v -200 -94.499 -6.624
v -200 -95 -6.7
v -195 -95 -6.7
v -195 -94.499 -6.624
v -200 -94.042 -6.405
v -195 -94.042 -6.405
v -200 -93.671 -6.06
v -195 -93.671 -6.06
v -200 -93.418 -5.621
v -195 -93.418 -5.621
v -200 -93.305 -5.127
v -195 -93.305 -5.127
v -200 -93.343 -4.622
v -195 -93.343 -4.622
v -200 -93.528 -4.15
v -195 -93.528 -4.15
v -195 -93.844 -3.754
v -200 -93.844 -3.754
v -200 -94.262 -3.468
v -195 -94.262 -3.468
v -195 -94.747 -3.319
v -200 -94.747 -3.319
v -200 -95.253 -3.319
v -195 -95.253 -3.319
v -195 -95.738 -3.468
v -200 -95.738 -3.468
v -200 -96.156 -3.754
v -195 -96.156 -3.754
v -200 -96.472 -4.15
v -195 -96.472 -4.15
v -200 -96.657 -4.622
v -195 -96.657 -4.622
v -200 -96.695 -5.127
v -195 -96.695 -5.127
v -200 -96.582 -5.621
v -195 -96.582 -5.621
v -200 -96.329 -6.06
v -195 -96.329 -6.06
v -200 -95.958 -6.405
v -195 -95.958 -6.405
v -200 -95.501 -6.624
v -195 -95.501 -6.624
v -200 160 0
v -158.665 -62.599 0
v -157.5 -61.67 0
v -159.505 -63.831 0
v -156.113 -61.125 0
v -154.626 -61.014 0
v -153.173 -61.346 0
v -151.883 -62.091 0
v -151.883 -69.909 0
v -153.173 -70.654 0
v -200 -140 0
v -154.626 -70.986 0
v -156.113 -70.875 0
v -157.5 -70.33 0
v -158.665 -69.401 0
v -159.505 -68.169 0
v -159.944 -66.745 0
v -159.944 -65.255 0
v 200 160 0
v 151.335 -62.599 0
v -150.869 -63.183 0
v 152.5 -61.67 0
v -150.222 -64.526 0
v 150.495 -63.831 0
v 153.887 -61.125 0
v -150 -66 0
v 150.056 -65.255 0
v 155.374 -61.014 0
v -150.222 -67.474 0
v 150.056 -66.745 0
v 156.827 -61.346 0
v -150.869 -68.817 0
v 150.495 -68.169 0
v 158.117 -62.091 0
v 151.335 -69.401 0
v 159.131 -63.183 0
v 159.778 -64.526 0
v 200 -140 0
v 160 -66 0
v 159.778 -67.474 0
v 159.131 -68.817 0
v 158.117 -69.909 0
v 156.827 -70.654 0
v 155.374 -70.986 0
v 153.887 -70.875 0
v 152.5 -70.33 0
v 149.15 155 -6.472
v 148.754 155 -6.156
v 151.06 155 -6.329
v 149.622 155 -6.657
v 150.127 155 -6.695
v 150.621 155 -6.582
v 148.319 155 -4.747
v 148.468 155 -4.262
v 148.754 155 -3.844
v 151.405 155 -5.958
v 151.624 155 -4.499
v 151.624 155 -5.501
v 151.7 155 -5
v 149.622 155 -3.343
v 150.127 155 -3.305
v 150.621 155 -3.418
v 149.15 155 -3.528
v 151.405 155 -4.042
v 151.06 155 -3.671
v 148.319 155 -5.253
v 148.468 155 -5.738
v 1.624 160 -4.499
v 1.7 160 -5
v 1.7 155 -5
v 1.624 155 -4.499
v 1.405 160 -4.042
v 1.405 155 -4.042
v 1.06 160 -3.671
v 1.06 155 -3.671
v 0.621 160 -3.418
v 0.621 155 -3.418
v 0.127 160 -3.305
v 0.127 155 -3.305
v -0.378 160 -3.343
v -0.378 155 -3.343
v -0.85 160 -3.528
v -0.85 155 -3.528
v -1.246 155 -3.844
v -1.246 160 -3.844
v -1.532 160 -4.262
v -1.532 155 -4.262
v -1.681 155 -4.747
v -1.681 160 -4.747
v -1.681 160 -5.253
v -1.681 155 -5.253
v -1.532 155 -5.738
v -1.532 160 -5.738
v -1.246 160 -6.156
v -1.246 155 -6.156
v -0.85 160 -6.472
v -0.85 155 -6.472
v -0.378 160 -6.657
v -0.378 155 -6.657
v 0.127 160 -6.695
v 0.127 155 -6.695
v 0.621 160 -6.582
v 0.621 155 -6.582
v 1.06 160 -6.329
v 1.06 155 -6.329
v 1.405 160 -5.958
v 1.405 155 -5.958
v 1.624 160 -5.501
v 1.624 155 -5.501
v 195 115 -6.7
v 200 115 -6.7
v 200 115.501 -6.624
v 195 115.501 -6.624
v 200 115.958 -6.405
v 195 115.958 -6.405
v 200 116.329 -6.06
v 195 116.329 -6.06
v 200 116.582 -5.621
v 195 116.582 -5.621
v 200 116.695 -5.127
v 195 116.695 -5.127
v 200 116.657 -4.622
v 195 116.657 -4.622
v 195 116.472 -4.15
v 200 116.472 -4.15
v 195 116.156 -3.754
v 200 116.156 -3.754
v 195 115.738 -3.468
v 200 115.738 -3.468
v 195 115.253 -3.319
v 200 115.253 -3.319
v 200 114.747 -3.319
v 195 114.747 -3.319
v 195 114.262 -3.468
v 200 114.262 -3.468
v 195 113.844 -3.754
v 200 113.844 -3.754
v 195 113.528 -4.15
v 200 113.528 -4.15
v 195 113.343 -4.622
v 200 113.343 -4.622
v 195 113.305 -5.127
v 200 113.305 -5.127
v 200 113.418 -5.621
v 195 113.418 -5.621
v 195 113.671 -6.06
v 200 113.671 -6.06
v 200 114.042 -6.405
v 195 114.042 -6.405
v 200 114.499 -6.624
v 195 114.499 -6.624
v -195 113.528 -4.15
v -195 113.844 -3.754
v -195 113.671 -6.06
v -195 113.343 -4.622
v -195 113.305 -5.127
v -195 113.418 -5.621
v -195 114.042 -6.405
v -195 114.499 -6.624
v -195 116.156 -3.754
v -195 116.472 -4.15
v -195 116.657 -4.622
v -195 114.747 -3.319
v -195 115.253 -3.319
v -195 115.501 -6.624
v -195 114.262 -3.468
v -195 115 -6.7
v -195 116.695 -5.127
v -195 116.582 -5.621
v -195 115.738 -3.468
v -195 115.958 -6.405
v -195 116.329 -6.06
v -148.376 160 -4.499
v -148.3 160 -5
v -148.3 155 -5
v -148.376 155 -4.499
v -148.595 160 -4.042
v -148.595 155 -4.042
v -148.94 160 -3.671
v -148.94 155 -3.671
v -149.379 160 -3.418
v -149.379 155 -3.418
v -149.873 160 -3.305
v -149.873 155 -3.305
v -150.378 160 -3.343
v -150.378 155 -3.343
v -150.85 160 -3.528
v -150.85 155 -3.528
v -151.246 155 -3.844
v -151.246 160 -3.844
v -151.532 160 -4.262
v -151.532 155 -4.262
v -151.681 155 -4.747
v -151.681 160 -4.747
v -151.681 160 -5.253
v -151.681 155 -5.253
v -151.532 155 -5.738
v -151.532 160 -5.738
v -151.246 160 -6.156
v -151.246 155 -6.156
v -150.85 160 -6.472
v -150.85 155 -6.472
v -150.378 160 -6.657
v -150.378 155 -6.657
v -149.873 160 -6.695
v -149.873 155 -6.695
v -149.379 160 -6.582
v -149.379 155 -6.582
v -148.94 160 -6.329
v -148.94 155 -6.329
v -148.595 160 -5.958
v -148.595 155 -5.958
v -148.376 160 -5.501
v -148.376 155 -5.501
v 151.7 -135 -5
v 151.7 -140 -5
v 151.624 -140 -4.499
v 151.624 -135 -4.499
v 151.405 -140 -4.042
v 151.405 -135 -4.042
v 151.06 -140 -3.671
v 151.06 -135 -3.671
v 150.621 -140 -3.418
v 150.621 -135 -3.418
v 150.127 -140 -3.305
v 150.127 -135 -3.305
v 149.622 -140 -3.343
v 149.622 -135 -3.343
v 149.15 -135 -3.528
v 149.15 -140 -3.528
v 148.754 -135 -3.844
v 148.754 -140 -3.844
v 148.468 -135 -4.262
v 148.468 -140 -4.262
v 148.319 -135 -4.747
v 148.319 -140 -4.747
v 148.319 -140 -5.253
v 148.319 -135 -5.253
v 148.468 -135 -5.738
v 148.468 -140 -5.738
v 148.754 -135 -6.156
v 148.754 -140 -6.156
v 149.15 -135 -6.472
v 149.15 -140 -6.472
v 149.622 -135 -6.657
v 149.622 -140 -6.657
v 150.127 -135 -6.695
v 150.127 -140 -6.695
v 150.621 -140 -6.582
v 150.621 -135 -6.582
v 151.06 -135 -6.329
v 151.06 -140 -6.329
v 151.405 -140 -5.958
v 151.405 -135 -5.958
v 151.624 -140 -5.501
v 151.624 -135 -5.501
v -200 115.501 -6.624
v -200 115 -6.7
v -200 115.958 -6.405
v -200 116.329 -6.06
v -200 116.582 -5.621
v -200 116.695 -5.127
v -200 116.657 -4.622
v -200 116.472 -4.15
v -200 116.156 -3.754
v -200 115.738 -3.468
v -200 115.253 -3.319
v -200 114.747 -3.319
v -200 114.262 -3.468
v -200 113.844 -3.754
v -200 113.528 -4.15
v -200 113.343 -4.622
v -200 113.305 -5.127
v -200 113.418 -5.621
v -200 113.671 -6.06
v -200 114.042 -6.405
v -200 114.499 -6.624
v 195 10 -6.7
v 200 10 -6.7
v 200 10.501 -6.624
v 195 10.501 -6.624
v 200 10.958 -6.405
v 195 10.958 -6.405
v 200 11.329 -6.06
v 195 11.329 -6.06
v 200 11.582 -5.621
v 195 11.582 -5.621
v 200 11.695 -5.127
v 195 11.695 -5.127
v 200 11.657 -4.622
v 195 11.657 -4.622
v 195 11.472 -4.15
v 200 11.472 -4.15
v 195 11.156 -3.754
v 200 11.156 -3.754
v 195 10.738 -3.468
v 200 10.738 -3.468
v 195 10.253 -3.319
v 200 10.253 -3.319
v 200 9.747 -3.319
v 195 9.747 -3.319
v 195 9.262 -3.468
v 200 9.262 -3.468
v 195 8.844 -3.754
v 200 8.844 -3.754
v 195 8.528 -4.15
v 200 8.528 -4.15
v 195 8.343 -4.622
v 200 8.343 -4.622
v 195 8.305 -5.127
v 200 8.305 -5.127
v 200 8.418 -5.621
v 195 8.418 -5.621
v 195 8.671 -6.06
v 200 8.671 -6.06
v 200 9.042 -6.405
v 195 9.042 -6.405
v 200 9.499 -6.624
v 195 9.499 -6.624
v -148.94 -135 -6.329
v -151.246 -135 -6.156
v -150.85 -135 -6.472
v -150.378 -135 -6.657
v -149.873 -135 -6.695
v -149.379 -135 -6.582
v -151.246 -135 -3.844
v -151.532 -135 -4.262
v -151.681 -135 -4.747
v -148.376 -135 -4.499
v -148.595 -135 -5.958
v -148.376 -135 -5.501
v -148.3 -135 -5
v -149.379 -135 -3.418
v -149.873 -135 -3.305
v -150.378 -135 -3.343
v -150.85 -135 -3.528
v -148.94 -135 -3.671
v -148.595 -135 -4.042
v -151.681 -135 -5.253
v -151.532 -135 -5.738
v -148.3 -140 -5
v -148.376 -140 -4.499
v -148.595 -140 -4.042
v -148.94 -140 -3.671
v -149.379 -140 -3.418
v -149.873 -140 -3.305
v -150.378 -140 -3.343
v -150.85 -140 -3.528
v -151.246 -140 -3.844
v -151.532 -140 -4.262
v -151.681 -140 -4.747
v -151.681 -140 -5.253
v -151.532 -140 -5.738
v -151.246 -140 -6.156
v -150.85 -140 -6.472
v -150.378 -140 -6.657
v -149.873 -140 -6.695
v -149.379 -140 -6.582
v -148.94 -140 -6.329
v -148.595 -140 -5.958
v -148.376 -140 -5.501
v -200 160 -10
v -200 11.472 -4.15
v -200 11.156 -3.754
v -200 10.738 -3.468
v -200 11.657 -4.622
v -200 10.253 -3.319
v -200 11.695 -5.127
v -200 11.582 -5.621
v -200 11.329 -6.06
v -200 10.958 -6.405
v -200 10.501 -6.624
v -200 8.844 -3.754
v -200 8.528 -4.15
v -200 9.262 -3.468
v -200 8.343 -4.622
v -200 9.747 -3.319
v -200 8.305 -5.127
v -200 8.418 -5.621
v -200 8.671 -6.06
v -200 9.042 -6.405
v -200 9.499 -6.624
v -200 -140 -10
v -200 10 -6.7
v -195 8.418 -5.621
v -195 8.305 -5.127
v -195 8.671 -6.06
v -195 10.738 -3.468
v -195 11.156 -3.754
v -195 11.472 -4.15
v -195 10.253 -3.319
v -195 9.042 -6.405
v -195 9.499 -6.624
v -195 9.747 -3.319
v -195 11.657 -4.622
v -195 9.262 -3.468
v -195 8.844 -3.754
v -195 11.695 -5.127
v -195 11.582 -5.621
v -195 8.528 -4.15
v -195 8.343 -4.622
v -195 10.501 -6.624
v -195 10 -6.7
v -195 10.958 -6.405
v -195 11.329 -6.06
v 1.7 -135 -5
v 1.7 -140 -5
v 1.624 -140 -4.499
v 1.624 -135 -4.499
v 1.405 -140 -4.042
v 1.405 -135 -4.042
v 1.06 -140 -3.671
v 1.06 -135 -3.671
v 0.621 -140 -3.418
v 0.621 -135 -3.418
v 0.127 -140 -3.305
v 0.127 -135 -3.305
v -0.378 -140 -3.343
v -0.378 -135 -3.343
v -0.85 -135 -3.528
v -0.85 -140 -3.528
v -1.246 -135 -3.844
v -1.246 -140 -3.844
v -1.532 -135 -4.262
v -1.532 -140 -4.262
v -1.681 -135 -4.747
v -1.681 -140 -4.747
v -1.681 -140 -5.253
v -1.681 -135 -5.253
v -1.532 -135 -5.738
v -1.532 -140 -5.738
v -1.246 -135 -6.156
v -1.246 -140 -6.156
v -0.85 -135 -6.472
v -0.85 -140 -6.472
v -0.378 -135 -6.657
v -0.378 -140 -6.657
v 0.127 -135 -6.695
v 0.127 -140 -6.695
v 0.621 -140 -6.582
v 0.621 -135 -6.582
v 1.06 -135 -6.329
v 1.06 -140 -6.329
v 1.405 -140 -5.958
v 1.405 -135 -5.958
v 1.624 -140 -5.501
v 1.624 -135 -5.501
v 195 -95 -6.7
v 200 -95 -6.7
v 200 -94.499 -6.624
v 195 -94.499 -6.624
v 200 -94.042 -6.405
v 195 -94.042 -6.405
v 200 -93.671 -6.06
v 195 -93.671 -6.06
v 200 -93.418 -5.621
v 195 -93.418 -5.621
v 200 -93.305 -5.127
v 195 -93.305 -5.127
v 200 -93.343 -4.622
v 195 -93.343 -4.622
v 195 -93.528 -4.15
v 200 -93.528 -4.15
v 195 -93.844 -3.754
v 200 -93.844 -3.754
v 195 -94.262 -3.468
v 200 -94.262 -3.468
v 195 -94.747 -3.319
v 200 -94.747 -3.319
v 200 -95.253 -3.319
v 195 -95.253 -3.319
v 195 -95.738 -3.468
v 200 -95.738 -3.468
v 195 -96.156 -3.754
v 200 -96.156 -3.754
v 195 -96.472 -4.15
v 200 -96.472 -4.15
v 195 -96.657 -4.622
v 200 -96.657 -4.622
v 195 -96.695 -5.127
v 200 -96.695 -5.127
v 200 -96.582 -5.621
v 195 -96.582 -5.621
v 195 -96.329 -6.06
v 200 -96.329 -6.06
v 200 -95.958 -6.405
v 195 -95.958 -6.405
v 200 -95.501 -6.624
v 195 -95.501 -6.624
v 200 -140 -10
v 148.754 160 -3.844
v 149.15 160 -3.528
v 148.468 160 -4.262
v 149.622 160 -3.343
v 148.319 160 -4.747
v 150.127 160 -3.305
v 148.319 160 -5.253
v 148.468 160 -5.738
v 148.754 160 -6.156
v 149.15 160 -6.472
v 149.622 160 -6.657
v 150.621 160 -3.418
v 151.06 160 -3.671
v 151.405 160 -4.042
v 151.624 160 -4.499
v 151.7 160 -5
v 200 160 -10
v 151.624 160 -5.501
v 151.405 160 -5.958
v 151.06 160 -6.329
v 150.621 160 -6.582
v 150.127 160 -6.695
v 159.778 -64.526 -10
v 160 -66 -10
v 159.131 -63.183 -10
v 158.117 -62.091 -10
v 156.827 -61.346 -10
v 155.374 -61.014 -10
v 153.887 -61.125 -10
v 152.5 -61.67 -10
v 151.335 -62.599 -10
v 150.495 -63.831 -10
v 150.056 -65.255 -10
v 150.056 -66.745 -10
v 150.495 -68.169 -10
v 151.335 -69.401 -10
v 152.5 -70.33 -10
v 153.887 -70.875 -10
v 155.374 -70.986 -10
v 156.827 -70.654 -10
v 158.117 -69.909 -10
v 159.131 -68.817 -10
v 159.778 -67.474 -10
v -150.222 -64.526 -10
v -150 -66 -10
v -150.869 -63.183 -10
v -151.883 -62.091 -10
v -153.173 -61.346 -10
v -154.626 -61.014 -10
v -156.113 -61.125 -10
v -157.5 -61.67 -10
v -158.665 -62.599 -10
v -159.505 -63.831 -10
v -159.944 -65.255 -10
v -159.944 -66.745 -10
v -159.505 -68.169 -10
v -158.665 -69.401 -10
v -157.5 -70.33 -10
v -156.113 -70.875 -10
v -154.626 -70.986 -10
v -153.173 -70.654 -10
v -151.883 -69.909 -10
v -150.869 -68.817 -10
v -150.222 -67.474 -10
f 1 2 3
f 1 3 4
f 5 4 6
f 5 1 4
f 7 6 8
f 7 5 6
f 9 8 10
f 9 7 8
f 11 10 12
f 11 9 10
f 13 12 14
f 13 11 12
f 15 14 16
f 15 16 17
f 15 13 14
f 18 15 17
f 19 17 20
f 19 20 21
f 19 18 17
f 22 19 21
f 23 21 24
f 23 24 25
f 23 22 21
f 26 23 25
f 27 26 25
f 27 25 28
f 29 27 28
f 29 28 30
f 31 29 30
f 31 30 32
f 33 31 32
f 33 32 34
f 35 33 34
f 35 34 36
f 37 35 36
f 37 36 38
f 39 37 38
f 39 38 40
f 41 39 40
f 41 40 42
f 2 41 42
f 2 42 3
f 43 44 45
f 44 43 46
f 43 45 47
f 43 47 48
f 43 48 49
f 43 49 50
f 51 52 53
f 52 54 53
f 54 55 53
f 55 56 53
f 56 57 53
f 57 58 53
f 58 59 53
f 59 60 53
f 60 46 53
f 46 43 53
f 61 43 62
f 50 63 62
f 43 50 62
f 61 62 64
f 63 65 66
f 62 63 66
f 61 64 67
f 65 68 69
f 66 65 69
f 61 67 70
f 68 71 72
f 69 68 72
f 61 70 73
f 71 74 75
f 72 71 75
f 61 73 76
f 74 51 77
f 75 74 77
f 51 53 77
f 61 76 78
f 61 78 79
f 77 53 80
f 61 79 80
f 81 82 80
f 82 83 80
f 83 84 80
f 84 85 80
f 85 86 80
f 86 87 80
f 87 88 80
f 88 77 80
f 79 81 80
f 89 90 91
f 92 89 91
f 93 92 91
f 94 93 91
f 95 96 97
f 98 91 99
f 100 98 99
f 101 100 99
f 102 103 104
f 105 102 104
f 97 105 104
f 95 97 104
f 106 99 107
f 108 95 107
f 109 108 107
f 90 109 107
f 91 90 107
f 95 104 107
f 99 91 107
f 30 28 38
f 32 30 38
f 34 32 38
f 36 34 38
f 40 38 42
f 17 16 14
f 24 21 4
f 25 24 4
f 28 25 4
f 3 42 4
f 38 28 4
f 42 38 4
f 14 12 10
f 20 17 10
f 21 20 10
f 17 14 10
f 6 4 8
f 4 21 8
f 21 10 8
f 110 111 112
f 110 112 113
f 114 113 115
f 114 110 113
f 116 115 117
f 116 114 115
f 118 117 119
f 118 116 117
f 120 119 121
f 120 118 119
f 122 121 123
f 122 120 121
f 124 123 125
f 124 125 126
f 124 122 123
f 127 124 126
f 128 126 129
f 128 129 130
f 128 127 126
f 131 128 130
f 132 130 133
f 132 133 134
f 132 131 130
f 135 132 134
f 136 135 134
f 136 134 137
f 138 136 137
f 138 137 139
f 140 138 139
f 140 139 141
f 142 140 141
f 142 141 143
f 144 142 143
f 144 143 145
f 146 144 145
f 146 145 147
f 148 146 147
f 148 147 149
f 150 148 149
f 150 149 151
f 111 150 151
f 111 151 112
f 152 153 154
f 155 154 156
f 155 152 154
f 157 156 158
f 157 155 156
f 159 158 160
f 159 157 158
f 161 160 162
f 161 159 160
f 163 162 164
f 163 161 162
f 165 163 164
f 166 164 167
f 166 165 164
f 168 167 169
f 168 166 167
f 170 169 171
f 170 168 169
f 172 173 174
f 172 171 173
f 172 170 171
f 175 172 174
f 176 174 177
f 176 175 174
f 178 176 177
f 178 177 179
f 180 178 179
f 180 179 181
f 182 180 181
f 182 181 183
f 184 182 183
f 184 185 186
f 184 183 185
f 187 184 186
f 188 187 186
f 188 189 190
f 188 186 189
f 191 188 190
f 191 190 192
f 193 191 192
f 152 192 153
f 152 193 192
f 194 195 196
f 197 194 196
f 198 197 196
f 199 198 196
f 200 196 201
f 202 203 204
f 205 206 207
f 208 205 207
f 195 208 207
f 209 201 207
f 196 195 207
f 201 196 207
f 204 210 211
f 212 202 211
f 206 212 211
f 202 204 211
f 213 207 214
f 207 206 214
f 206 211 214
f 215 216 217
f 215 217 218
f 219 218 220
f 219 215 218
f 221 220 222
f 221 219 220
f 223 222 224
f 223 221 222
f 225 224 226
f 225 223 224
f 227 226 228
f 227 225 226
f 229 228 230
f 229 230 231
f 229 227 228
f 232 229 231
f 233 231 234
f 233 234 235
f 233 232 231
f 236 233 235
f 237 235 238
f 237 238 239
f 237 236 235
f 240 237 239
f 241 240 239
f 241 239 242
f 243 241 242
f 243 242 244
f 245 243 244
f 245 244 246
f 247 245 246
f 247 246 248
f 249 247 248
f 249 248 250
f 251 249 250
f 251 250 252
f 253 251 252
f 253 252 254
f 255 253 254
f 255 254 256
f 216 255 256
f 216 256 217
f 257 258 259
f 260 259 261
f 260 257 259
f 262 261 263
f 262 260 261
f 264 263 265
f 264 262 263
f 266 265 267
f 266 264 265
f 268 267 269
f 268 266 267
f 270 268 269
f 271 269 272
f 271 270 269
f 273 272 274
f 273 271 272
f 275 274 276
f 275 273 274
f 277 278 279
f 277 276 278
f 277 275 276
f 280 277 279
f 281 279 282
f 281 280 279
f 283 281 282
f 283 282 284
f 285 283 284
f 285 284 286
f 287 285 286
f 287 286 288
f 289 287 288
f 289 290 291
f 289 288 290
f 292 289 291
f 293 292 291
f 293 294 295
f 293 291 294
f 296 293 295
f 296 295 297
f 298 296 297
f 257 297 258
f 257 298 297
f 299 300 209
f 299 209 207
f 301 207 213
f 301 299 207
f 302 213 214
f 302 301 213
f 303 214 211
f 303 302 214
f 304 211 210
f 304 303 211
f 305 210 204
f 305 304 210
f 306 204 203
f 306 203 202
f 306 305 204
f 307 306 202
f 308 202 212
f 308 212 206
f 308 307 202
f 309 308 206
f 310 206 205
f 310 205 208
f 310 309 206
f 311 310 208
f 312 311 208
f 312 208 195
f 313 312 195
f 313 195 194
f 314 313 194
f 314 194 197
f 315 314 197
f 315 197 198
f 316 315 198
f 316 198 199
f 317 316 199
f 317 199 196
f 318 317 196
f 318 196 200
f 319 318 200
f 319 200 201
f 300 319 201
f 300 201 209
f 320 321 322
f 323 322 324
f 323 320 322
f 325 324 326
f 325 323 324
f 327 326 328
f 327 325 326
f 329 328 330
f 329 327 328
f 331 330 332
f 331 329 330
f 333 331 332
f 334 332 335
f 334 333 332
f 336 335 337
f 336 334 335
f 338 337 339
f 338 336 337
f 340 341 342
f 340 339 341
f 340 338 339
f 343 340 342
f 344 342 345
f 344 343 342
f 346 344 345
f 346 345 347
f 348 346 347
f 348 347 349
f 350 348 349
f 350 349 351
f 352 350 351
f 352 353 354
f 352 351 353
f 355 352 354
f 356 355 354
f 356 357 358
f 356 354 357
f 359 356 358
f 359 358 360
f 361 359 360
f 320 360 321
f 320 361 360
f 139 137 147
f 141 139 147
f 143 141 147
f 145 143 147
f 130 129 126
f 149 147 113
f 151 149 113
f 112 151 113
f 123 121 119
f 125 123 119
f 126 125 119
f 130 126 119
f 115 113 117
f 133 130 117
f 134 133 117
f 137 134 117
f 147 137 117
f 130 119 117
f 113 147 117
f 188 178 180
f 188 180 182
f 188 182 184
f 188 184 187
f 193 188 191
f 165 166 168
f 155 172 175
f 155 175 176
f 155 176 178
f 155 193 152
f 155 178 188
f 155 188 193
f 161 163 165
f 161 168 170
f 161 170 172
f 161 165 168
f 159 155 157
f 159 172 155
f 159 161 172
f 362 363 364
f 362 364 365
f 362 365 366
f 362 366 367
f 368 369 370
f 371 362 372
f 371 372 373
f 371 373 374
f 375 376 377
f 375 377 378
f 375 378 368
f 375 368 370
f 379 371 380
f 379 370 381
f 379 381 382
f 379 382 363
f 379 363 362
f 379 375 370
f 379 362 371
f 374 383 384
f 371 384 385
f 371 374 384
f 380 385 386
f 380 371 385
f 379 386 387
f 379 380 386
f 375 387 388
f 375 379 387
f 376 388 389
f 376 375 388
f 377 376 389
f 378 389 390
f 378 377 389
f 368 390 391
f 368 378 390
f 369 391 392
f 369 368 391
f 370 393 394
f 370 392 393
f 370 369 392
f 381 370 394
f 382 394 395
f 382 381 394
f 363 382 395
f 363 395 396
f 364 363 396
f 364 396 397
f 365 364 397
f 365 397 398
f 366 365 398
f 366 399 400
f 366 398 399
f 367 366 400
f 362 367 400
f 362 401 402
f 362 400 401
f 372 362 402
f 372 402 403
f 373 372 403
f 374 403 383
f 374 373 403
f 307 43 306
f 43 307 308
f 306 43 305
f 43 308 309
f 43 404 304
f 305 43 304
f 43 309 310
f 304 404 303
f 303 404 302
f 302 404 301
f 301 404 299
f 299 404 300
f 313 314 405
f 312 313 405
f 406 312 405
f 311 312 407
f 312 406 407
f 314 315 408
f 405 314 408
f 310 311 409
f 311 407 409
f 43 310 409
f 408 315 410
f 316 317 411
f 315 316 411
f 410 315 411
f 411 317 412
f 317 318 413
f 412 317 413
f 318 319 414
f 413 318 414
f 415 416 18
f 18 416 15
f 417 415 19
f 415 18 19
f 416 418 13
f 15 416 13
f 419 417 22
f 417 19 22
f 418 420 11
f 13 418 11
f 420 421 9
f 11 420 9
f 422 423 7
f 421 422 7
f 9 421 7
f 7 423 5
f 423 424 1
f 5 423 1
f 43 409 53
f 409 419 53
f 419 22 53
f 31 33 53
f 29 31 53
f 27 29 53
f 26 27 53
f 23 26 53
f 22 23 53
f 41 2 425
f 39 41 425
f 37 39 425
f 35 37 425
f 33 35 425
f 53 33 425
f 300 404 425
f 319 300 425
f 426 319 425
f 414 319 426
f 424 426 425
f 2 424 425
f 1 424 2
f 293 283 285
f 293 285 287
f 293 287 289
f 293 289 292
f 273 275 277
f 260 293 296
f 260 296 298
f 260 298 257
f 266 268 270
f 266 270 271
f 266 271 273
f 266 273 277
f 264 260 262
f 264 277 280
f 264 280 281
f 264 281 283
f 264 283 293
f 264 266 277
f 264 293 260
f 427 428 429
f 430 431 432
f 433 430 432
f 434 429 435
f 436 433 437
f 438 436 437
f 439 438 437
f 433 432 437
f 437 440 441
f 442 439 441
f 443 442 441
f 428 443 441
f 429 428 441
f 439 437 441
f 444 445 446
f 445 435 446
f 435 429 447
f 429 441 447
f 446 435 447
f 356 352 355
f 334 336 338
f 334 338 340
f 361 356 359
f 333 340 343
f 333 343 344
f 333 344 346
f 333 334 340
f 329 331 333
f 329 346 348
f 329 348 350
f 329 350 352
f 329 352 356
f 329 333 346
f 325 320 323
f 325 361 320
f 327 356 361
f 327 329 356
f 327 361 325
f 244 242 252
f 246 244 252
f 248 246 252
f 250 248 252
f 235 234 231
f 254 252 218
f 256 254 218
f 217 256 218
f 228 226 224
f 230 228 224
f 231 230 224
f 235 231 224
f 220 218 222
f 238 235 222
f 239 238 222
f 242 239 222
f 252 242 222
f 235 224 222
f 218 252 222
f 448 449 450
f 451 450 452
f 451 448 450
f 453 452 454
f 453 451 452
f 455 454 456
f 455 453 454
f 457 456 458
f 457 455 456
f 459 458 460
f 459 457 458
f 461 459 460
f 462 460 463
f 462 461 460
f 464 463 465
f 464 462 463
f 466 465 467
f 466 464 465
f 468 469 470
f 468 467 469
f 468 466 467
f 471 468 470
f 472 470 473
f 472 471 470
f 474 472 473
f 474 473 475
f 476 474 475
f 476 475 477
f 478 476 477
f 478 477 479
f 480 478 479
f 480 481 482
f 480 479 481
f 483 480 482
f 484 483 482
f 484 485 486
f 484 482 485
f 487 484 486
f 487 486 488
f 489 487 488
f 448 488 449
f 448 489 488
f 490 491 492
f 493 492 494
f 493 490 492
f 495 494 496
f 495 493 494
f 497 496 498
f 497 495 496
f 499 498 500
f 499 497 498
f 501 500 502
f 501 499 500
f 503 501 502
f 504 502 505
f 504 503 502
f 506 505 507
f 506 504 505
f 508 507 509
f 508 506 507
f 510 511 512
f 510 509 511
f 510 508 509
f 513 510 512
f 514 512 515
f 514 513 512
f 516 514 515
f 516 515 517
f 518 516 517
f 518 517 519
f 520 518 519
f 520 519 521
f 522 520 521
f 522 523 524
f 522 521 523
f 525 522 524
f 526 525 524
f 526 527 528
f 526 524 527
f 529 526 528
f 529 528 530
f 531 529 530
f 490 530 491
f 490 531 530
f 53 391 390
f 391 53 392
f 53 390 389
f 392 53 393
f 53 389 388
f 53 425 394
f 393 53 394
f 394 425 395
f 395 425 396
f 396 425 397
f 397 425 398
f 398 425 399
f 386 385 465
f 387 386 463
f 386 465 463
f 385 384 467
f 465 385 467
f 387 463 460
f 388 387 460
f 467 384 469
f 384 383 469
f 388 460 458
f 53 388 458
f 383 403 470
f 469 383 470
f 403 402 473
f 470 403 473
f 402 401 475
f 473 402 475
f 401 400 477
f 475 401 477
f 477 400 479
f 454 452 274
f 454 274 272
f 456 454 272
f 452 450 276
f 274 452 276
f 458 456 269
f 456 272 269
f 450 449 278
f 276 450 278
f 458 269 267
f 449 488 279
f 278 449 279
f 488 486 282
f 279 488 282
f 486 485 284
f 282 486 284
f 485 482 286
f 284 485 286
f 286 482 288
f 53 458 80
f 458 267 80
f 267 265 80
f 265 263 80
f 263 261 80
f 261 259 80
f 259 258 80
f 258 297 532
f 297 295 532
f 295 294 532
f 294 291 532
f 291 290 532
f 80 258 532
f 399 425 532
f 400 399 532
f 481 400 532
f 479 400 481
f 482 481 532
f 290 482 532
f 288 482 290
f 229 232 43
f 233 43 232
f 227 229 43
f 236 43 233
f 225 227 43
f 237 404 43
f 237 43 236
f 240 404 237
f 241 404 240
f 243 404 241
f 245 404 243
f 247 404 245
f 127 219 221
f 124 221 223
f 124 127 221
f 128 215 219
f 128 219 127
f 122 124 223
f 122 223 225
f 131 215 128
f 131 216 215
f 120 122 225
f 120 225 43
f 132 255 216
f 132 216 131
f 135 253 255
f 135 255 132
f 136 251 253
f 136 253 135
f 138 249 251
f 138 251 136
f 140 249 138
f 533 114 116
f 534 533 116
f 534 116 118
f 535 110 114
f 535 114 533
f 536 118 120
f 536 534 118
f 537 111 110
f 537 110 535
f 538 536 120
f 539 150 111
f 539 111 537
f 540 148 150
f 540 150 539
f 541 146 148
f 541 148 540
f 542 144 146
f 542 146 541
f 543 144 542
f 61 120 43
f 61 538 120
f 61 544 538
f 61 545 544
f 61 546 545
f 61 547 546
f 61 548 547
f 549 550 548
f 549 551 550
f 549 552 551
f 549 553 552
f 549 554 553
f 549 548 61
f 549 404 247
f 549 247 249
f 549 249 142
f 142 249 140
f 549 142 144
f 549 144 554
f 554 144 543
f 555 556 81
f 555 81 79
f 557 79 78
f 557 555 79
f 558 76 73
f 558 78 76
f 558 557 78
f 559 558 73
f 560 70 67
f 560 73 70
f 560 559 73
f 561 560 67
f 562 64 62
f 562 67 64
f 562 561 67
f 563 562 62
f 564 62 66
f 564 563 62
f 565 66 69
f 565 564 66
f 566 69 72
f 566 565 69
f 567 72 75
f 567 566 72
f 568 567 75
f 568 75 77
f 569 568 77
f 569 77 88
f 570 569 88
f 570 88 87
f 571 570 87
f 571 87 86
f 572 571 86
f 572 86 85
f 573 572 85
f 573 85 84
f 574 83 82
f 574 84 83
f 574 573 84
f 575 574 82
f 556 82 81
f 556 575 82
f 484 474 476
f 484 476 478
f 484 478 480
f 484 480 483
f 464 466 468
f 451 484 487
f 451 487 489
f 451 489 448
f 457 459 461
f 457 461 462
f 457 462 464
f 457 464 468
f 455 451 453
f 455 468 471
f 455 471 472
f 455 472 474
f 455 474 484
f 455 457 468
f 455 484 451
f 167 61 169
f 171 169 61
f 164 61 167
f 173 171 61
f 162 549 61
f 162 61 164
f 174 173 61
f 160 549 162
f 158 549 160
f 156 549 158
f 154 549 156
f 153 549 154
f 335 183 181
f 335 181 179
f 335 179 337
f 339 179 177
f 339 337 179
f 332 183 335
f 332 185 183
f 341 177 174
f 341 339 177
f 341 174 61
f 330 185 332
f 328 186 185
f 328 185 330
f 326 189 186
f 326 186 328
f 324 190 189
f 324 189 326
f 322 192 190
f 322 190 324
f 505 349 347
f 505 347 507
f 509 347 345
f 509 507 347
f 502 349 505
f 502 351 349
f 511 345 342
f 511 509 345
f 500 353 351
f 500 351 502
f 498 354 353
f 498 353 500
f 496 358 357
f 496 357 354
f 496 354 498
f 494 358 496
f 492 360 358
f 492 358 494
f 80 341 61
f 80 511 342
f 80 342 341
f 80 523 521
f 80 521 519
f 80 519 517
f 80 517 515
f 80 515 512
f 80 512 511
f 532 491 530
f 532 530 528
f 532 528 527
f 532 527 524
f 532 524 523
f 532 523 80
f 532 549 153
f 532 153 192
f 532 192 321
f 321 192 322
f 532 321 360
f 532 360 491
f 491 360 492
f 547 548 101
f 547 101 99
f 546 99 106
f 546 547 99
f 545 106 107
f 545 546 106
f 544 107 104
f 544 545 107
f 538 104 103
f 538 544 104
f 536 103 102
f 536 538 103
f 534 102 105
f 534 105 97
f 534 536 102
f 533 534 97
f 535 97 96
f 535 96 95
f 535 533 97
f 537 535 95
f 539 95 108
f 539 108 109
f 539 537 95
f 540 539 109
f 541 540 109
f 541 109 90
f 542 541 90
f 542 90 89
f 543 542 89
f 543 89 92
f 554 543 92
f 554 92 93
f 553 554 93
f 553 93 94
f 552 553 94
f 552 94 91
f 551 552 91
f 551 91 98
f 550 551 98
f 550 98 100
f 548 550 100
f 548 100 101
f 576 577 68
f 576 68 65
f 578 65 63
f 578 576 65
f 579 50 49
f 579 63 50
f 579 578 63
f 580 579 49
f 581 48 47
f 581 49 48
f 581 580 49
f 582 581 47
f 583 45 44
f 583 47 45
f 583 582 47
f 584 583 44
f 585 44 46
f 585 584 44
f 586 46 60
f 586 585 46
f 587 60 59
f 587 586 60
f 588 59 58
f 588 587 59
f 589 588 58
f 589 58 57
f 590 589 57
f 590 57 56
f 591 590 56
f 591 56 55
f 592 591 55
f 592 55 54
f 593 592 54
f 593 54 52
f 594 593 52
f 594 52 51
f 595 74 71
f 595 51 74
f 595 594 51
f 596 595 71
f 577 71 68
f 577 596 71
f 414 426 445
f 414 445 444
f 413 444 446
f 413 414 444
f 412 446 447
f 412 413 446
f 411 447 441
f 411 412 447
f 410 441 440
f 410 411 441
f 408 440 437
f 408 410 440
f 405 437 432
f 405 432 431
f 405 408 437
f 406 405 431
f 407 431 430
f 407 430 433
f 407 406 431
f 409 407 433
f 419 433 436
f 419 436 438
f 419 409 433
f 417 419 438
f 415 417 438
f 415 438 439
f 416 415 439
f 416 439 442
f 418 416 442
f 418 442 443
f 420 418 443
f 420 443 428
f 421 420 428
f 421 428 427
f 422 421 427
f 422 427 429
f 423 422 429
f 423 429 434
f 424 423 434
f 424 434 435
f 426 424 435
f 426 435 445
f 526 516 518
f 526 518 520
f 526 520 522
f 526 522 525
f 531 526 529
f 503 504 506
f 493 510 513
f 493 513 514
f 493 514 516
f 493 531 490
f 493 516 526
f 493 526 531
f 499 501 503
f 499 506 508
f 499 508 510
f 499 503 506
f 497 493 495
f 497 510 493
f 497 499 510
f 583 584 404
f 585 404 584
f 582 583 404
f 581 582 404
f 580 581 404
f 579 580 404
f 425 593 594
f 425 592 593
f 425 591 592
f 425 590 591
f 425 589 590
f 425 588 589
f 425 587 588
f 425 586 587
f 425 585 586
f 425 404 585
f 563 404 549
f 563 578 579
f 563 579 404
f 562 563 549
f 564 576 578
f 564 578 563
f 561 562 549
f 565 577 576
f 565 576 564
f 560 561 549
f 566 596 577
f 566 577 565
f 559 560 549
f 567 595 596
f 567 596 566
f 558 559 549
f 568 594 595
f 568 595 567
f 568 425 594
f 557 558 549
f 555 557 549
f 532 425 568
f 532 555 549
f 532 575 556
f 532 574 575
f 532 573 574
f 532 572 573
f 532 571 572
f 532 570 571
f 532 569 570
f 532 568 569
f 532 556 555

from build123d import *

# Parameters (mm, degrees)
CYLINDER050_R           = 1.7
CYLINDER050_DEPTH       = 20
CYLINDER050_PITCH_ANGLE = 90
CYLINDER049_R           = 1.7
CYLINDER049_DEPTH       = 20
CYLINDER049_PITCH_ANGLE = 90
CYLINDER051_R           = 1.7
CYLINDER051_DEPTH       = 20
CYLINDER051_PITCH_ANGLE = 90
CYLINDER047_R           = 1.7
CYLINDER047_DEPTH       = 20
CYLINDER047_PITCH_ANGLE = 90
CYLINDER046_R           = 1.7
CYLINDER046_DEPTH       = 20
CYLINDER046_PITCH_ANGLE = 90
CYLINDER048_R           = 1.7
CYLINDER048_DEPTH       = 20
CYLINDER048_PITCH_ANGLE = 90
SKETCH023_R             = 1.7
PAD021_DEPTH            = 20
SKETCH024_R             = 1.7
PAD022_DEPTH            = 20
CYLINDER001_R           = 5
CYLINDER001_DEPTH       = 50
CYLINDER_R              = 5
CYLINDER_DEPTH          = 50
SKETCH002_W             = 400
SKETCH002_H             = 300
PAD002_DEPTH            = 10


with BuildPart() as cylinder050:
    # Cylinder050 → Cylinder050 (new body)
    with BuildSketch(Plane.XY):
        Circle(CYLINDER050_R)
    extrude(amount=CYLINDER050_DEPTH)


with BuildPart() as cylinder050_1:
    # Cylinder050 pitch: moved
    add(cylinder050.part.rotate(Axis((0, 0, 0), (0, 1, 0)), CYLINDER050_PITCH_ANGLE))


with BuildPart() as cylinder050_2:
    # Cylinder050 placement: moved
    add(cylinder050_1.part.moved(Location((-220, 120, -5))))


with BuildPart() as cylinder049:
    # Cylinder049 → Cylinder049 (new body)
    with BuildSketch(Plane.XY):
        Circle(CYLINDER049_R)
    extrude(amount=CYLINDER049_DEPTH)


with BuildPart() as cylinder049_1:
    # Cylinder049 pitch: moved
    add(cylinder049.part.rotate(Axis((0, 0, 0), (0, 1, 0)), CYLINDER049_PITCH_ANGLE))


with BuildPart() as cylinder049_2:
    # Cylinder049 placement: moved
    add(cylinder049_1.part.moved(Location((-220, -90, -5))))


with BuildPart() as fusion016:
    # Cylinder051 → Cylinder051 (new body)
    with BuildSketch(Plane.XY):
        Circle(CYLINDER051_R)
    extrude(amount=CYLINDER051_DEPTH)


with BuildPart() as fusion016_1:
    # Cylinder051 pitch: moved
    add(fusion016.part.rotate(Axis((0, 0, 0), (0, 1, 0)), CYLINDER051_PITCH_ANGLE))


with BuildPart() as fusion016_2:
    # Cylinder051 placement: moved
    add(fusion016_1.part.moved(Location((-220, 15, -5))))

    # Fusion016: union Cylinder050, Cylinder049
    add(cylinder050_2.part)
    add(cylinder049_2.part)


with BuildPart() as fusion016_3:
    # Fusion016 placement: moved
    add(fusion016_2.part.moved(Location((415, -5, 0))))


with BuildPart() as cylinder047:
    # Cylinder047 → Cylinder047 (new body)
    with BuildSketch(Plane.XY):
        Circle(CYLINDER047_R)
    extrude(amount=CYLINDER047_DEPTH)


with BuildPart() as cylinder047_1:
    # Cylinder047 pitch: moved
    add(cylinder047.part.rotate(Axis((0, 0, 0), (0, 1, 0)), CYLINDER047_PITCH_ANGLE))


with BuildPart() as cylinder047_2:
    # Cylinder047 placement: moved
    add(cylinder047_1.part.moved(Location((-220, 120, -5))))


with BuildPart() as cylinder046:
    # Cylinder046 → Cylinder046 (new body)
    with BuildSketch(Plane.XY):
        Circle(CYLINDER046_R)
    extrude(amount=CYLINDER046_DEPTH)


with BuildPart() as cylinder046_1:
    # Cylinder046 pitch: moved
    add(cylinder046.part.rotate(Axis((0, 0, 0), (0, 1, 0)), CYLINDER046_PITCH_ANGLE))


with BuildPart() as cylinder046_2:
    # Cylinder046 placement: moved
    add(cylinder046_1.part.moved(Location((-220, -90, -5))))


with BuildPart() as fusion015:
    # Cylinder048 → Cylinder048 (new body)
    with BuildSketch(Plane.XY):
        Circle(CYLINDER048_R)
    extrude(amount=CYLINDER048_DEPTH)


with BuildPart() as fusion015_1:
    # Cylinder048 pitch: moved
    add(fusion015.part.rotate(Axis((0, 0, 0), (0, 1, 0)), CYLINDER048_PITCH_ANGLE))


with BuildPart() as fusion015_2:
    # Cylinder048 placement: moved
    add(fusion015_1.part.moved(Location((-220, 15, -5))))

    # Fusion015: union Cylinder047, Cylinder046
    add(cylinder047_2.part)
    add(cylinder046_2.part)


with BuildPart() as fusion015_3:
    # Fusion015 placement: moved
    add(fusion015_2.part.moved(Location((5, -5, 0))))


with BuildPart() as pad021:
    # Sketch023 → Pad021 (new body)
    with BuildSketch(Plane.XZ.offset(135)):
        with Locations((-150, -5)):
            Circle(SKETCH023_R)
        with Locations((0, -5)):
            Circle(SKETCH023_R)
        with Locations((150, -5)):
            Circle(SKETCH023_R)
    extrude(amount=PAD021_DEPTH)


with BuildPart() as fusion017:
    # Sketch024 → Pad022 (new body)
    with BuildSketch(Plane.XZ.offset(-175)):
        with Locations((-150, -5)):
            Circle(SKETCH024_R)
        with Locations((0, -5)):
            Circle(SKETCH024_R)
        with Locations((150, -5)):
            Circle(SKETCH024_R)
    extrude(amount=PAD022_DEPTH)

    # Fusion017: union Fusion016, Fusion015, Pad021
    add(fusion016_3.part)
    add(fusion015_3.part)
    add(pad021.part)


with BuildPart() as cylinder001:
    # Cylinder001 → Cylinder001 (new body)
    with BuildSketch(Plane(origin=(-155, -66, -30), x_dir=(1, 0, 0), z_dir=(0, 0, 1))):
        Circle(CYLINDER001_R)
    extrude(amount=CYLINDER001_DEPTH)


with BuildPart() as fusion018:
    # Cylinder → Cylinder (new body)
    with BuildSketch(Plane(origin=(155, -66, -25), x_dir=(1, 0, 0), z_dir=(0, 0, 1))):
        Circle(CYLINDER_R)
    extrude(amount=CYLINDER_DEPTH)

    # Fusion018: union Cylinder001
    add(cylinder001.part)


with BuildPart() as cut018:
    # Sketch002 → Pad002 (new body)
    with BuildSketch(Plane(origin=(0, 0, -10), x_dir=(1, 0, 0), z_dir=(0, 0, -1))):
        with Locations((0, -10)):
            Rectangle(SKETCH002_W, SKETCH002_H)
    extrude(amount=-PAD002_DEPTH)

    # Cut: cut Fusion018
    add(fusion018.part, mode=Mode.SUBTRACT)

    # Cut018: cut Fusion017
    add(fusion017.part, mode=Mode.SUBTRACT)


solid = cut018.part
